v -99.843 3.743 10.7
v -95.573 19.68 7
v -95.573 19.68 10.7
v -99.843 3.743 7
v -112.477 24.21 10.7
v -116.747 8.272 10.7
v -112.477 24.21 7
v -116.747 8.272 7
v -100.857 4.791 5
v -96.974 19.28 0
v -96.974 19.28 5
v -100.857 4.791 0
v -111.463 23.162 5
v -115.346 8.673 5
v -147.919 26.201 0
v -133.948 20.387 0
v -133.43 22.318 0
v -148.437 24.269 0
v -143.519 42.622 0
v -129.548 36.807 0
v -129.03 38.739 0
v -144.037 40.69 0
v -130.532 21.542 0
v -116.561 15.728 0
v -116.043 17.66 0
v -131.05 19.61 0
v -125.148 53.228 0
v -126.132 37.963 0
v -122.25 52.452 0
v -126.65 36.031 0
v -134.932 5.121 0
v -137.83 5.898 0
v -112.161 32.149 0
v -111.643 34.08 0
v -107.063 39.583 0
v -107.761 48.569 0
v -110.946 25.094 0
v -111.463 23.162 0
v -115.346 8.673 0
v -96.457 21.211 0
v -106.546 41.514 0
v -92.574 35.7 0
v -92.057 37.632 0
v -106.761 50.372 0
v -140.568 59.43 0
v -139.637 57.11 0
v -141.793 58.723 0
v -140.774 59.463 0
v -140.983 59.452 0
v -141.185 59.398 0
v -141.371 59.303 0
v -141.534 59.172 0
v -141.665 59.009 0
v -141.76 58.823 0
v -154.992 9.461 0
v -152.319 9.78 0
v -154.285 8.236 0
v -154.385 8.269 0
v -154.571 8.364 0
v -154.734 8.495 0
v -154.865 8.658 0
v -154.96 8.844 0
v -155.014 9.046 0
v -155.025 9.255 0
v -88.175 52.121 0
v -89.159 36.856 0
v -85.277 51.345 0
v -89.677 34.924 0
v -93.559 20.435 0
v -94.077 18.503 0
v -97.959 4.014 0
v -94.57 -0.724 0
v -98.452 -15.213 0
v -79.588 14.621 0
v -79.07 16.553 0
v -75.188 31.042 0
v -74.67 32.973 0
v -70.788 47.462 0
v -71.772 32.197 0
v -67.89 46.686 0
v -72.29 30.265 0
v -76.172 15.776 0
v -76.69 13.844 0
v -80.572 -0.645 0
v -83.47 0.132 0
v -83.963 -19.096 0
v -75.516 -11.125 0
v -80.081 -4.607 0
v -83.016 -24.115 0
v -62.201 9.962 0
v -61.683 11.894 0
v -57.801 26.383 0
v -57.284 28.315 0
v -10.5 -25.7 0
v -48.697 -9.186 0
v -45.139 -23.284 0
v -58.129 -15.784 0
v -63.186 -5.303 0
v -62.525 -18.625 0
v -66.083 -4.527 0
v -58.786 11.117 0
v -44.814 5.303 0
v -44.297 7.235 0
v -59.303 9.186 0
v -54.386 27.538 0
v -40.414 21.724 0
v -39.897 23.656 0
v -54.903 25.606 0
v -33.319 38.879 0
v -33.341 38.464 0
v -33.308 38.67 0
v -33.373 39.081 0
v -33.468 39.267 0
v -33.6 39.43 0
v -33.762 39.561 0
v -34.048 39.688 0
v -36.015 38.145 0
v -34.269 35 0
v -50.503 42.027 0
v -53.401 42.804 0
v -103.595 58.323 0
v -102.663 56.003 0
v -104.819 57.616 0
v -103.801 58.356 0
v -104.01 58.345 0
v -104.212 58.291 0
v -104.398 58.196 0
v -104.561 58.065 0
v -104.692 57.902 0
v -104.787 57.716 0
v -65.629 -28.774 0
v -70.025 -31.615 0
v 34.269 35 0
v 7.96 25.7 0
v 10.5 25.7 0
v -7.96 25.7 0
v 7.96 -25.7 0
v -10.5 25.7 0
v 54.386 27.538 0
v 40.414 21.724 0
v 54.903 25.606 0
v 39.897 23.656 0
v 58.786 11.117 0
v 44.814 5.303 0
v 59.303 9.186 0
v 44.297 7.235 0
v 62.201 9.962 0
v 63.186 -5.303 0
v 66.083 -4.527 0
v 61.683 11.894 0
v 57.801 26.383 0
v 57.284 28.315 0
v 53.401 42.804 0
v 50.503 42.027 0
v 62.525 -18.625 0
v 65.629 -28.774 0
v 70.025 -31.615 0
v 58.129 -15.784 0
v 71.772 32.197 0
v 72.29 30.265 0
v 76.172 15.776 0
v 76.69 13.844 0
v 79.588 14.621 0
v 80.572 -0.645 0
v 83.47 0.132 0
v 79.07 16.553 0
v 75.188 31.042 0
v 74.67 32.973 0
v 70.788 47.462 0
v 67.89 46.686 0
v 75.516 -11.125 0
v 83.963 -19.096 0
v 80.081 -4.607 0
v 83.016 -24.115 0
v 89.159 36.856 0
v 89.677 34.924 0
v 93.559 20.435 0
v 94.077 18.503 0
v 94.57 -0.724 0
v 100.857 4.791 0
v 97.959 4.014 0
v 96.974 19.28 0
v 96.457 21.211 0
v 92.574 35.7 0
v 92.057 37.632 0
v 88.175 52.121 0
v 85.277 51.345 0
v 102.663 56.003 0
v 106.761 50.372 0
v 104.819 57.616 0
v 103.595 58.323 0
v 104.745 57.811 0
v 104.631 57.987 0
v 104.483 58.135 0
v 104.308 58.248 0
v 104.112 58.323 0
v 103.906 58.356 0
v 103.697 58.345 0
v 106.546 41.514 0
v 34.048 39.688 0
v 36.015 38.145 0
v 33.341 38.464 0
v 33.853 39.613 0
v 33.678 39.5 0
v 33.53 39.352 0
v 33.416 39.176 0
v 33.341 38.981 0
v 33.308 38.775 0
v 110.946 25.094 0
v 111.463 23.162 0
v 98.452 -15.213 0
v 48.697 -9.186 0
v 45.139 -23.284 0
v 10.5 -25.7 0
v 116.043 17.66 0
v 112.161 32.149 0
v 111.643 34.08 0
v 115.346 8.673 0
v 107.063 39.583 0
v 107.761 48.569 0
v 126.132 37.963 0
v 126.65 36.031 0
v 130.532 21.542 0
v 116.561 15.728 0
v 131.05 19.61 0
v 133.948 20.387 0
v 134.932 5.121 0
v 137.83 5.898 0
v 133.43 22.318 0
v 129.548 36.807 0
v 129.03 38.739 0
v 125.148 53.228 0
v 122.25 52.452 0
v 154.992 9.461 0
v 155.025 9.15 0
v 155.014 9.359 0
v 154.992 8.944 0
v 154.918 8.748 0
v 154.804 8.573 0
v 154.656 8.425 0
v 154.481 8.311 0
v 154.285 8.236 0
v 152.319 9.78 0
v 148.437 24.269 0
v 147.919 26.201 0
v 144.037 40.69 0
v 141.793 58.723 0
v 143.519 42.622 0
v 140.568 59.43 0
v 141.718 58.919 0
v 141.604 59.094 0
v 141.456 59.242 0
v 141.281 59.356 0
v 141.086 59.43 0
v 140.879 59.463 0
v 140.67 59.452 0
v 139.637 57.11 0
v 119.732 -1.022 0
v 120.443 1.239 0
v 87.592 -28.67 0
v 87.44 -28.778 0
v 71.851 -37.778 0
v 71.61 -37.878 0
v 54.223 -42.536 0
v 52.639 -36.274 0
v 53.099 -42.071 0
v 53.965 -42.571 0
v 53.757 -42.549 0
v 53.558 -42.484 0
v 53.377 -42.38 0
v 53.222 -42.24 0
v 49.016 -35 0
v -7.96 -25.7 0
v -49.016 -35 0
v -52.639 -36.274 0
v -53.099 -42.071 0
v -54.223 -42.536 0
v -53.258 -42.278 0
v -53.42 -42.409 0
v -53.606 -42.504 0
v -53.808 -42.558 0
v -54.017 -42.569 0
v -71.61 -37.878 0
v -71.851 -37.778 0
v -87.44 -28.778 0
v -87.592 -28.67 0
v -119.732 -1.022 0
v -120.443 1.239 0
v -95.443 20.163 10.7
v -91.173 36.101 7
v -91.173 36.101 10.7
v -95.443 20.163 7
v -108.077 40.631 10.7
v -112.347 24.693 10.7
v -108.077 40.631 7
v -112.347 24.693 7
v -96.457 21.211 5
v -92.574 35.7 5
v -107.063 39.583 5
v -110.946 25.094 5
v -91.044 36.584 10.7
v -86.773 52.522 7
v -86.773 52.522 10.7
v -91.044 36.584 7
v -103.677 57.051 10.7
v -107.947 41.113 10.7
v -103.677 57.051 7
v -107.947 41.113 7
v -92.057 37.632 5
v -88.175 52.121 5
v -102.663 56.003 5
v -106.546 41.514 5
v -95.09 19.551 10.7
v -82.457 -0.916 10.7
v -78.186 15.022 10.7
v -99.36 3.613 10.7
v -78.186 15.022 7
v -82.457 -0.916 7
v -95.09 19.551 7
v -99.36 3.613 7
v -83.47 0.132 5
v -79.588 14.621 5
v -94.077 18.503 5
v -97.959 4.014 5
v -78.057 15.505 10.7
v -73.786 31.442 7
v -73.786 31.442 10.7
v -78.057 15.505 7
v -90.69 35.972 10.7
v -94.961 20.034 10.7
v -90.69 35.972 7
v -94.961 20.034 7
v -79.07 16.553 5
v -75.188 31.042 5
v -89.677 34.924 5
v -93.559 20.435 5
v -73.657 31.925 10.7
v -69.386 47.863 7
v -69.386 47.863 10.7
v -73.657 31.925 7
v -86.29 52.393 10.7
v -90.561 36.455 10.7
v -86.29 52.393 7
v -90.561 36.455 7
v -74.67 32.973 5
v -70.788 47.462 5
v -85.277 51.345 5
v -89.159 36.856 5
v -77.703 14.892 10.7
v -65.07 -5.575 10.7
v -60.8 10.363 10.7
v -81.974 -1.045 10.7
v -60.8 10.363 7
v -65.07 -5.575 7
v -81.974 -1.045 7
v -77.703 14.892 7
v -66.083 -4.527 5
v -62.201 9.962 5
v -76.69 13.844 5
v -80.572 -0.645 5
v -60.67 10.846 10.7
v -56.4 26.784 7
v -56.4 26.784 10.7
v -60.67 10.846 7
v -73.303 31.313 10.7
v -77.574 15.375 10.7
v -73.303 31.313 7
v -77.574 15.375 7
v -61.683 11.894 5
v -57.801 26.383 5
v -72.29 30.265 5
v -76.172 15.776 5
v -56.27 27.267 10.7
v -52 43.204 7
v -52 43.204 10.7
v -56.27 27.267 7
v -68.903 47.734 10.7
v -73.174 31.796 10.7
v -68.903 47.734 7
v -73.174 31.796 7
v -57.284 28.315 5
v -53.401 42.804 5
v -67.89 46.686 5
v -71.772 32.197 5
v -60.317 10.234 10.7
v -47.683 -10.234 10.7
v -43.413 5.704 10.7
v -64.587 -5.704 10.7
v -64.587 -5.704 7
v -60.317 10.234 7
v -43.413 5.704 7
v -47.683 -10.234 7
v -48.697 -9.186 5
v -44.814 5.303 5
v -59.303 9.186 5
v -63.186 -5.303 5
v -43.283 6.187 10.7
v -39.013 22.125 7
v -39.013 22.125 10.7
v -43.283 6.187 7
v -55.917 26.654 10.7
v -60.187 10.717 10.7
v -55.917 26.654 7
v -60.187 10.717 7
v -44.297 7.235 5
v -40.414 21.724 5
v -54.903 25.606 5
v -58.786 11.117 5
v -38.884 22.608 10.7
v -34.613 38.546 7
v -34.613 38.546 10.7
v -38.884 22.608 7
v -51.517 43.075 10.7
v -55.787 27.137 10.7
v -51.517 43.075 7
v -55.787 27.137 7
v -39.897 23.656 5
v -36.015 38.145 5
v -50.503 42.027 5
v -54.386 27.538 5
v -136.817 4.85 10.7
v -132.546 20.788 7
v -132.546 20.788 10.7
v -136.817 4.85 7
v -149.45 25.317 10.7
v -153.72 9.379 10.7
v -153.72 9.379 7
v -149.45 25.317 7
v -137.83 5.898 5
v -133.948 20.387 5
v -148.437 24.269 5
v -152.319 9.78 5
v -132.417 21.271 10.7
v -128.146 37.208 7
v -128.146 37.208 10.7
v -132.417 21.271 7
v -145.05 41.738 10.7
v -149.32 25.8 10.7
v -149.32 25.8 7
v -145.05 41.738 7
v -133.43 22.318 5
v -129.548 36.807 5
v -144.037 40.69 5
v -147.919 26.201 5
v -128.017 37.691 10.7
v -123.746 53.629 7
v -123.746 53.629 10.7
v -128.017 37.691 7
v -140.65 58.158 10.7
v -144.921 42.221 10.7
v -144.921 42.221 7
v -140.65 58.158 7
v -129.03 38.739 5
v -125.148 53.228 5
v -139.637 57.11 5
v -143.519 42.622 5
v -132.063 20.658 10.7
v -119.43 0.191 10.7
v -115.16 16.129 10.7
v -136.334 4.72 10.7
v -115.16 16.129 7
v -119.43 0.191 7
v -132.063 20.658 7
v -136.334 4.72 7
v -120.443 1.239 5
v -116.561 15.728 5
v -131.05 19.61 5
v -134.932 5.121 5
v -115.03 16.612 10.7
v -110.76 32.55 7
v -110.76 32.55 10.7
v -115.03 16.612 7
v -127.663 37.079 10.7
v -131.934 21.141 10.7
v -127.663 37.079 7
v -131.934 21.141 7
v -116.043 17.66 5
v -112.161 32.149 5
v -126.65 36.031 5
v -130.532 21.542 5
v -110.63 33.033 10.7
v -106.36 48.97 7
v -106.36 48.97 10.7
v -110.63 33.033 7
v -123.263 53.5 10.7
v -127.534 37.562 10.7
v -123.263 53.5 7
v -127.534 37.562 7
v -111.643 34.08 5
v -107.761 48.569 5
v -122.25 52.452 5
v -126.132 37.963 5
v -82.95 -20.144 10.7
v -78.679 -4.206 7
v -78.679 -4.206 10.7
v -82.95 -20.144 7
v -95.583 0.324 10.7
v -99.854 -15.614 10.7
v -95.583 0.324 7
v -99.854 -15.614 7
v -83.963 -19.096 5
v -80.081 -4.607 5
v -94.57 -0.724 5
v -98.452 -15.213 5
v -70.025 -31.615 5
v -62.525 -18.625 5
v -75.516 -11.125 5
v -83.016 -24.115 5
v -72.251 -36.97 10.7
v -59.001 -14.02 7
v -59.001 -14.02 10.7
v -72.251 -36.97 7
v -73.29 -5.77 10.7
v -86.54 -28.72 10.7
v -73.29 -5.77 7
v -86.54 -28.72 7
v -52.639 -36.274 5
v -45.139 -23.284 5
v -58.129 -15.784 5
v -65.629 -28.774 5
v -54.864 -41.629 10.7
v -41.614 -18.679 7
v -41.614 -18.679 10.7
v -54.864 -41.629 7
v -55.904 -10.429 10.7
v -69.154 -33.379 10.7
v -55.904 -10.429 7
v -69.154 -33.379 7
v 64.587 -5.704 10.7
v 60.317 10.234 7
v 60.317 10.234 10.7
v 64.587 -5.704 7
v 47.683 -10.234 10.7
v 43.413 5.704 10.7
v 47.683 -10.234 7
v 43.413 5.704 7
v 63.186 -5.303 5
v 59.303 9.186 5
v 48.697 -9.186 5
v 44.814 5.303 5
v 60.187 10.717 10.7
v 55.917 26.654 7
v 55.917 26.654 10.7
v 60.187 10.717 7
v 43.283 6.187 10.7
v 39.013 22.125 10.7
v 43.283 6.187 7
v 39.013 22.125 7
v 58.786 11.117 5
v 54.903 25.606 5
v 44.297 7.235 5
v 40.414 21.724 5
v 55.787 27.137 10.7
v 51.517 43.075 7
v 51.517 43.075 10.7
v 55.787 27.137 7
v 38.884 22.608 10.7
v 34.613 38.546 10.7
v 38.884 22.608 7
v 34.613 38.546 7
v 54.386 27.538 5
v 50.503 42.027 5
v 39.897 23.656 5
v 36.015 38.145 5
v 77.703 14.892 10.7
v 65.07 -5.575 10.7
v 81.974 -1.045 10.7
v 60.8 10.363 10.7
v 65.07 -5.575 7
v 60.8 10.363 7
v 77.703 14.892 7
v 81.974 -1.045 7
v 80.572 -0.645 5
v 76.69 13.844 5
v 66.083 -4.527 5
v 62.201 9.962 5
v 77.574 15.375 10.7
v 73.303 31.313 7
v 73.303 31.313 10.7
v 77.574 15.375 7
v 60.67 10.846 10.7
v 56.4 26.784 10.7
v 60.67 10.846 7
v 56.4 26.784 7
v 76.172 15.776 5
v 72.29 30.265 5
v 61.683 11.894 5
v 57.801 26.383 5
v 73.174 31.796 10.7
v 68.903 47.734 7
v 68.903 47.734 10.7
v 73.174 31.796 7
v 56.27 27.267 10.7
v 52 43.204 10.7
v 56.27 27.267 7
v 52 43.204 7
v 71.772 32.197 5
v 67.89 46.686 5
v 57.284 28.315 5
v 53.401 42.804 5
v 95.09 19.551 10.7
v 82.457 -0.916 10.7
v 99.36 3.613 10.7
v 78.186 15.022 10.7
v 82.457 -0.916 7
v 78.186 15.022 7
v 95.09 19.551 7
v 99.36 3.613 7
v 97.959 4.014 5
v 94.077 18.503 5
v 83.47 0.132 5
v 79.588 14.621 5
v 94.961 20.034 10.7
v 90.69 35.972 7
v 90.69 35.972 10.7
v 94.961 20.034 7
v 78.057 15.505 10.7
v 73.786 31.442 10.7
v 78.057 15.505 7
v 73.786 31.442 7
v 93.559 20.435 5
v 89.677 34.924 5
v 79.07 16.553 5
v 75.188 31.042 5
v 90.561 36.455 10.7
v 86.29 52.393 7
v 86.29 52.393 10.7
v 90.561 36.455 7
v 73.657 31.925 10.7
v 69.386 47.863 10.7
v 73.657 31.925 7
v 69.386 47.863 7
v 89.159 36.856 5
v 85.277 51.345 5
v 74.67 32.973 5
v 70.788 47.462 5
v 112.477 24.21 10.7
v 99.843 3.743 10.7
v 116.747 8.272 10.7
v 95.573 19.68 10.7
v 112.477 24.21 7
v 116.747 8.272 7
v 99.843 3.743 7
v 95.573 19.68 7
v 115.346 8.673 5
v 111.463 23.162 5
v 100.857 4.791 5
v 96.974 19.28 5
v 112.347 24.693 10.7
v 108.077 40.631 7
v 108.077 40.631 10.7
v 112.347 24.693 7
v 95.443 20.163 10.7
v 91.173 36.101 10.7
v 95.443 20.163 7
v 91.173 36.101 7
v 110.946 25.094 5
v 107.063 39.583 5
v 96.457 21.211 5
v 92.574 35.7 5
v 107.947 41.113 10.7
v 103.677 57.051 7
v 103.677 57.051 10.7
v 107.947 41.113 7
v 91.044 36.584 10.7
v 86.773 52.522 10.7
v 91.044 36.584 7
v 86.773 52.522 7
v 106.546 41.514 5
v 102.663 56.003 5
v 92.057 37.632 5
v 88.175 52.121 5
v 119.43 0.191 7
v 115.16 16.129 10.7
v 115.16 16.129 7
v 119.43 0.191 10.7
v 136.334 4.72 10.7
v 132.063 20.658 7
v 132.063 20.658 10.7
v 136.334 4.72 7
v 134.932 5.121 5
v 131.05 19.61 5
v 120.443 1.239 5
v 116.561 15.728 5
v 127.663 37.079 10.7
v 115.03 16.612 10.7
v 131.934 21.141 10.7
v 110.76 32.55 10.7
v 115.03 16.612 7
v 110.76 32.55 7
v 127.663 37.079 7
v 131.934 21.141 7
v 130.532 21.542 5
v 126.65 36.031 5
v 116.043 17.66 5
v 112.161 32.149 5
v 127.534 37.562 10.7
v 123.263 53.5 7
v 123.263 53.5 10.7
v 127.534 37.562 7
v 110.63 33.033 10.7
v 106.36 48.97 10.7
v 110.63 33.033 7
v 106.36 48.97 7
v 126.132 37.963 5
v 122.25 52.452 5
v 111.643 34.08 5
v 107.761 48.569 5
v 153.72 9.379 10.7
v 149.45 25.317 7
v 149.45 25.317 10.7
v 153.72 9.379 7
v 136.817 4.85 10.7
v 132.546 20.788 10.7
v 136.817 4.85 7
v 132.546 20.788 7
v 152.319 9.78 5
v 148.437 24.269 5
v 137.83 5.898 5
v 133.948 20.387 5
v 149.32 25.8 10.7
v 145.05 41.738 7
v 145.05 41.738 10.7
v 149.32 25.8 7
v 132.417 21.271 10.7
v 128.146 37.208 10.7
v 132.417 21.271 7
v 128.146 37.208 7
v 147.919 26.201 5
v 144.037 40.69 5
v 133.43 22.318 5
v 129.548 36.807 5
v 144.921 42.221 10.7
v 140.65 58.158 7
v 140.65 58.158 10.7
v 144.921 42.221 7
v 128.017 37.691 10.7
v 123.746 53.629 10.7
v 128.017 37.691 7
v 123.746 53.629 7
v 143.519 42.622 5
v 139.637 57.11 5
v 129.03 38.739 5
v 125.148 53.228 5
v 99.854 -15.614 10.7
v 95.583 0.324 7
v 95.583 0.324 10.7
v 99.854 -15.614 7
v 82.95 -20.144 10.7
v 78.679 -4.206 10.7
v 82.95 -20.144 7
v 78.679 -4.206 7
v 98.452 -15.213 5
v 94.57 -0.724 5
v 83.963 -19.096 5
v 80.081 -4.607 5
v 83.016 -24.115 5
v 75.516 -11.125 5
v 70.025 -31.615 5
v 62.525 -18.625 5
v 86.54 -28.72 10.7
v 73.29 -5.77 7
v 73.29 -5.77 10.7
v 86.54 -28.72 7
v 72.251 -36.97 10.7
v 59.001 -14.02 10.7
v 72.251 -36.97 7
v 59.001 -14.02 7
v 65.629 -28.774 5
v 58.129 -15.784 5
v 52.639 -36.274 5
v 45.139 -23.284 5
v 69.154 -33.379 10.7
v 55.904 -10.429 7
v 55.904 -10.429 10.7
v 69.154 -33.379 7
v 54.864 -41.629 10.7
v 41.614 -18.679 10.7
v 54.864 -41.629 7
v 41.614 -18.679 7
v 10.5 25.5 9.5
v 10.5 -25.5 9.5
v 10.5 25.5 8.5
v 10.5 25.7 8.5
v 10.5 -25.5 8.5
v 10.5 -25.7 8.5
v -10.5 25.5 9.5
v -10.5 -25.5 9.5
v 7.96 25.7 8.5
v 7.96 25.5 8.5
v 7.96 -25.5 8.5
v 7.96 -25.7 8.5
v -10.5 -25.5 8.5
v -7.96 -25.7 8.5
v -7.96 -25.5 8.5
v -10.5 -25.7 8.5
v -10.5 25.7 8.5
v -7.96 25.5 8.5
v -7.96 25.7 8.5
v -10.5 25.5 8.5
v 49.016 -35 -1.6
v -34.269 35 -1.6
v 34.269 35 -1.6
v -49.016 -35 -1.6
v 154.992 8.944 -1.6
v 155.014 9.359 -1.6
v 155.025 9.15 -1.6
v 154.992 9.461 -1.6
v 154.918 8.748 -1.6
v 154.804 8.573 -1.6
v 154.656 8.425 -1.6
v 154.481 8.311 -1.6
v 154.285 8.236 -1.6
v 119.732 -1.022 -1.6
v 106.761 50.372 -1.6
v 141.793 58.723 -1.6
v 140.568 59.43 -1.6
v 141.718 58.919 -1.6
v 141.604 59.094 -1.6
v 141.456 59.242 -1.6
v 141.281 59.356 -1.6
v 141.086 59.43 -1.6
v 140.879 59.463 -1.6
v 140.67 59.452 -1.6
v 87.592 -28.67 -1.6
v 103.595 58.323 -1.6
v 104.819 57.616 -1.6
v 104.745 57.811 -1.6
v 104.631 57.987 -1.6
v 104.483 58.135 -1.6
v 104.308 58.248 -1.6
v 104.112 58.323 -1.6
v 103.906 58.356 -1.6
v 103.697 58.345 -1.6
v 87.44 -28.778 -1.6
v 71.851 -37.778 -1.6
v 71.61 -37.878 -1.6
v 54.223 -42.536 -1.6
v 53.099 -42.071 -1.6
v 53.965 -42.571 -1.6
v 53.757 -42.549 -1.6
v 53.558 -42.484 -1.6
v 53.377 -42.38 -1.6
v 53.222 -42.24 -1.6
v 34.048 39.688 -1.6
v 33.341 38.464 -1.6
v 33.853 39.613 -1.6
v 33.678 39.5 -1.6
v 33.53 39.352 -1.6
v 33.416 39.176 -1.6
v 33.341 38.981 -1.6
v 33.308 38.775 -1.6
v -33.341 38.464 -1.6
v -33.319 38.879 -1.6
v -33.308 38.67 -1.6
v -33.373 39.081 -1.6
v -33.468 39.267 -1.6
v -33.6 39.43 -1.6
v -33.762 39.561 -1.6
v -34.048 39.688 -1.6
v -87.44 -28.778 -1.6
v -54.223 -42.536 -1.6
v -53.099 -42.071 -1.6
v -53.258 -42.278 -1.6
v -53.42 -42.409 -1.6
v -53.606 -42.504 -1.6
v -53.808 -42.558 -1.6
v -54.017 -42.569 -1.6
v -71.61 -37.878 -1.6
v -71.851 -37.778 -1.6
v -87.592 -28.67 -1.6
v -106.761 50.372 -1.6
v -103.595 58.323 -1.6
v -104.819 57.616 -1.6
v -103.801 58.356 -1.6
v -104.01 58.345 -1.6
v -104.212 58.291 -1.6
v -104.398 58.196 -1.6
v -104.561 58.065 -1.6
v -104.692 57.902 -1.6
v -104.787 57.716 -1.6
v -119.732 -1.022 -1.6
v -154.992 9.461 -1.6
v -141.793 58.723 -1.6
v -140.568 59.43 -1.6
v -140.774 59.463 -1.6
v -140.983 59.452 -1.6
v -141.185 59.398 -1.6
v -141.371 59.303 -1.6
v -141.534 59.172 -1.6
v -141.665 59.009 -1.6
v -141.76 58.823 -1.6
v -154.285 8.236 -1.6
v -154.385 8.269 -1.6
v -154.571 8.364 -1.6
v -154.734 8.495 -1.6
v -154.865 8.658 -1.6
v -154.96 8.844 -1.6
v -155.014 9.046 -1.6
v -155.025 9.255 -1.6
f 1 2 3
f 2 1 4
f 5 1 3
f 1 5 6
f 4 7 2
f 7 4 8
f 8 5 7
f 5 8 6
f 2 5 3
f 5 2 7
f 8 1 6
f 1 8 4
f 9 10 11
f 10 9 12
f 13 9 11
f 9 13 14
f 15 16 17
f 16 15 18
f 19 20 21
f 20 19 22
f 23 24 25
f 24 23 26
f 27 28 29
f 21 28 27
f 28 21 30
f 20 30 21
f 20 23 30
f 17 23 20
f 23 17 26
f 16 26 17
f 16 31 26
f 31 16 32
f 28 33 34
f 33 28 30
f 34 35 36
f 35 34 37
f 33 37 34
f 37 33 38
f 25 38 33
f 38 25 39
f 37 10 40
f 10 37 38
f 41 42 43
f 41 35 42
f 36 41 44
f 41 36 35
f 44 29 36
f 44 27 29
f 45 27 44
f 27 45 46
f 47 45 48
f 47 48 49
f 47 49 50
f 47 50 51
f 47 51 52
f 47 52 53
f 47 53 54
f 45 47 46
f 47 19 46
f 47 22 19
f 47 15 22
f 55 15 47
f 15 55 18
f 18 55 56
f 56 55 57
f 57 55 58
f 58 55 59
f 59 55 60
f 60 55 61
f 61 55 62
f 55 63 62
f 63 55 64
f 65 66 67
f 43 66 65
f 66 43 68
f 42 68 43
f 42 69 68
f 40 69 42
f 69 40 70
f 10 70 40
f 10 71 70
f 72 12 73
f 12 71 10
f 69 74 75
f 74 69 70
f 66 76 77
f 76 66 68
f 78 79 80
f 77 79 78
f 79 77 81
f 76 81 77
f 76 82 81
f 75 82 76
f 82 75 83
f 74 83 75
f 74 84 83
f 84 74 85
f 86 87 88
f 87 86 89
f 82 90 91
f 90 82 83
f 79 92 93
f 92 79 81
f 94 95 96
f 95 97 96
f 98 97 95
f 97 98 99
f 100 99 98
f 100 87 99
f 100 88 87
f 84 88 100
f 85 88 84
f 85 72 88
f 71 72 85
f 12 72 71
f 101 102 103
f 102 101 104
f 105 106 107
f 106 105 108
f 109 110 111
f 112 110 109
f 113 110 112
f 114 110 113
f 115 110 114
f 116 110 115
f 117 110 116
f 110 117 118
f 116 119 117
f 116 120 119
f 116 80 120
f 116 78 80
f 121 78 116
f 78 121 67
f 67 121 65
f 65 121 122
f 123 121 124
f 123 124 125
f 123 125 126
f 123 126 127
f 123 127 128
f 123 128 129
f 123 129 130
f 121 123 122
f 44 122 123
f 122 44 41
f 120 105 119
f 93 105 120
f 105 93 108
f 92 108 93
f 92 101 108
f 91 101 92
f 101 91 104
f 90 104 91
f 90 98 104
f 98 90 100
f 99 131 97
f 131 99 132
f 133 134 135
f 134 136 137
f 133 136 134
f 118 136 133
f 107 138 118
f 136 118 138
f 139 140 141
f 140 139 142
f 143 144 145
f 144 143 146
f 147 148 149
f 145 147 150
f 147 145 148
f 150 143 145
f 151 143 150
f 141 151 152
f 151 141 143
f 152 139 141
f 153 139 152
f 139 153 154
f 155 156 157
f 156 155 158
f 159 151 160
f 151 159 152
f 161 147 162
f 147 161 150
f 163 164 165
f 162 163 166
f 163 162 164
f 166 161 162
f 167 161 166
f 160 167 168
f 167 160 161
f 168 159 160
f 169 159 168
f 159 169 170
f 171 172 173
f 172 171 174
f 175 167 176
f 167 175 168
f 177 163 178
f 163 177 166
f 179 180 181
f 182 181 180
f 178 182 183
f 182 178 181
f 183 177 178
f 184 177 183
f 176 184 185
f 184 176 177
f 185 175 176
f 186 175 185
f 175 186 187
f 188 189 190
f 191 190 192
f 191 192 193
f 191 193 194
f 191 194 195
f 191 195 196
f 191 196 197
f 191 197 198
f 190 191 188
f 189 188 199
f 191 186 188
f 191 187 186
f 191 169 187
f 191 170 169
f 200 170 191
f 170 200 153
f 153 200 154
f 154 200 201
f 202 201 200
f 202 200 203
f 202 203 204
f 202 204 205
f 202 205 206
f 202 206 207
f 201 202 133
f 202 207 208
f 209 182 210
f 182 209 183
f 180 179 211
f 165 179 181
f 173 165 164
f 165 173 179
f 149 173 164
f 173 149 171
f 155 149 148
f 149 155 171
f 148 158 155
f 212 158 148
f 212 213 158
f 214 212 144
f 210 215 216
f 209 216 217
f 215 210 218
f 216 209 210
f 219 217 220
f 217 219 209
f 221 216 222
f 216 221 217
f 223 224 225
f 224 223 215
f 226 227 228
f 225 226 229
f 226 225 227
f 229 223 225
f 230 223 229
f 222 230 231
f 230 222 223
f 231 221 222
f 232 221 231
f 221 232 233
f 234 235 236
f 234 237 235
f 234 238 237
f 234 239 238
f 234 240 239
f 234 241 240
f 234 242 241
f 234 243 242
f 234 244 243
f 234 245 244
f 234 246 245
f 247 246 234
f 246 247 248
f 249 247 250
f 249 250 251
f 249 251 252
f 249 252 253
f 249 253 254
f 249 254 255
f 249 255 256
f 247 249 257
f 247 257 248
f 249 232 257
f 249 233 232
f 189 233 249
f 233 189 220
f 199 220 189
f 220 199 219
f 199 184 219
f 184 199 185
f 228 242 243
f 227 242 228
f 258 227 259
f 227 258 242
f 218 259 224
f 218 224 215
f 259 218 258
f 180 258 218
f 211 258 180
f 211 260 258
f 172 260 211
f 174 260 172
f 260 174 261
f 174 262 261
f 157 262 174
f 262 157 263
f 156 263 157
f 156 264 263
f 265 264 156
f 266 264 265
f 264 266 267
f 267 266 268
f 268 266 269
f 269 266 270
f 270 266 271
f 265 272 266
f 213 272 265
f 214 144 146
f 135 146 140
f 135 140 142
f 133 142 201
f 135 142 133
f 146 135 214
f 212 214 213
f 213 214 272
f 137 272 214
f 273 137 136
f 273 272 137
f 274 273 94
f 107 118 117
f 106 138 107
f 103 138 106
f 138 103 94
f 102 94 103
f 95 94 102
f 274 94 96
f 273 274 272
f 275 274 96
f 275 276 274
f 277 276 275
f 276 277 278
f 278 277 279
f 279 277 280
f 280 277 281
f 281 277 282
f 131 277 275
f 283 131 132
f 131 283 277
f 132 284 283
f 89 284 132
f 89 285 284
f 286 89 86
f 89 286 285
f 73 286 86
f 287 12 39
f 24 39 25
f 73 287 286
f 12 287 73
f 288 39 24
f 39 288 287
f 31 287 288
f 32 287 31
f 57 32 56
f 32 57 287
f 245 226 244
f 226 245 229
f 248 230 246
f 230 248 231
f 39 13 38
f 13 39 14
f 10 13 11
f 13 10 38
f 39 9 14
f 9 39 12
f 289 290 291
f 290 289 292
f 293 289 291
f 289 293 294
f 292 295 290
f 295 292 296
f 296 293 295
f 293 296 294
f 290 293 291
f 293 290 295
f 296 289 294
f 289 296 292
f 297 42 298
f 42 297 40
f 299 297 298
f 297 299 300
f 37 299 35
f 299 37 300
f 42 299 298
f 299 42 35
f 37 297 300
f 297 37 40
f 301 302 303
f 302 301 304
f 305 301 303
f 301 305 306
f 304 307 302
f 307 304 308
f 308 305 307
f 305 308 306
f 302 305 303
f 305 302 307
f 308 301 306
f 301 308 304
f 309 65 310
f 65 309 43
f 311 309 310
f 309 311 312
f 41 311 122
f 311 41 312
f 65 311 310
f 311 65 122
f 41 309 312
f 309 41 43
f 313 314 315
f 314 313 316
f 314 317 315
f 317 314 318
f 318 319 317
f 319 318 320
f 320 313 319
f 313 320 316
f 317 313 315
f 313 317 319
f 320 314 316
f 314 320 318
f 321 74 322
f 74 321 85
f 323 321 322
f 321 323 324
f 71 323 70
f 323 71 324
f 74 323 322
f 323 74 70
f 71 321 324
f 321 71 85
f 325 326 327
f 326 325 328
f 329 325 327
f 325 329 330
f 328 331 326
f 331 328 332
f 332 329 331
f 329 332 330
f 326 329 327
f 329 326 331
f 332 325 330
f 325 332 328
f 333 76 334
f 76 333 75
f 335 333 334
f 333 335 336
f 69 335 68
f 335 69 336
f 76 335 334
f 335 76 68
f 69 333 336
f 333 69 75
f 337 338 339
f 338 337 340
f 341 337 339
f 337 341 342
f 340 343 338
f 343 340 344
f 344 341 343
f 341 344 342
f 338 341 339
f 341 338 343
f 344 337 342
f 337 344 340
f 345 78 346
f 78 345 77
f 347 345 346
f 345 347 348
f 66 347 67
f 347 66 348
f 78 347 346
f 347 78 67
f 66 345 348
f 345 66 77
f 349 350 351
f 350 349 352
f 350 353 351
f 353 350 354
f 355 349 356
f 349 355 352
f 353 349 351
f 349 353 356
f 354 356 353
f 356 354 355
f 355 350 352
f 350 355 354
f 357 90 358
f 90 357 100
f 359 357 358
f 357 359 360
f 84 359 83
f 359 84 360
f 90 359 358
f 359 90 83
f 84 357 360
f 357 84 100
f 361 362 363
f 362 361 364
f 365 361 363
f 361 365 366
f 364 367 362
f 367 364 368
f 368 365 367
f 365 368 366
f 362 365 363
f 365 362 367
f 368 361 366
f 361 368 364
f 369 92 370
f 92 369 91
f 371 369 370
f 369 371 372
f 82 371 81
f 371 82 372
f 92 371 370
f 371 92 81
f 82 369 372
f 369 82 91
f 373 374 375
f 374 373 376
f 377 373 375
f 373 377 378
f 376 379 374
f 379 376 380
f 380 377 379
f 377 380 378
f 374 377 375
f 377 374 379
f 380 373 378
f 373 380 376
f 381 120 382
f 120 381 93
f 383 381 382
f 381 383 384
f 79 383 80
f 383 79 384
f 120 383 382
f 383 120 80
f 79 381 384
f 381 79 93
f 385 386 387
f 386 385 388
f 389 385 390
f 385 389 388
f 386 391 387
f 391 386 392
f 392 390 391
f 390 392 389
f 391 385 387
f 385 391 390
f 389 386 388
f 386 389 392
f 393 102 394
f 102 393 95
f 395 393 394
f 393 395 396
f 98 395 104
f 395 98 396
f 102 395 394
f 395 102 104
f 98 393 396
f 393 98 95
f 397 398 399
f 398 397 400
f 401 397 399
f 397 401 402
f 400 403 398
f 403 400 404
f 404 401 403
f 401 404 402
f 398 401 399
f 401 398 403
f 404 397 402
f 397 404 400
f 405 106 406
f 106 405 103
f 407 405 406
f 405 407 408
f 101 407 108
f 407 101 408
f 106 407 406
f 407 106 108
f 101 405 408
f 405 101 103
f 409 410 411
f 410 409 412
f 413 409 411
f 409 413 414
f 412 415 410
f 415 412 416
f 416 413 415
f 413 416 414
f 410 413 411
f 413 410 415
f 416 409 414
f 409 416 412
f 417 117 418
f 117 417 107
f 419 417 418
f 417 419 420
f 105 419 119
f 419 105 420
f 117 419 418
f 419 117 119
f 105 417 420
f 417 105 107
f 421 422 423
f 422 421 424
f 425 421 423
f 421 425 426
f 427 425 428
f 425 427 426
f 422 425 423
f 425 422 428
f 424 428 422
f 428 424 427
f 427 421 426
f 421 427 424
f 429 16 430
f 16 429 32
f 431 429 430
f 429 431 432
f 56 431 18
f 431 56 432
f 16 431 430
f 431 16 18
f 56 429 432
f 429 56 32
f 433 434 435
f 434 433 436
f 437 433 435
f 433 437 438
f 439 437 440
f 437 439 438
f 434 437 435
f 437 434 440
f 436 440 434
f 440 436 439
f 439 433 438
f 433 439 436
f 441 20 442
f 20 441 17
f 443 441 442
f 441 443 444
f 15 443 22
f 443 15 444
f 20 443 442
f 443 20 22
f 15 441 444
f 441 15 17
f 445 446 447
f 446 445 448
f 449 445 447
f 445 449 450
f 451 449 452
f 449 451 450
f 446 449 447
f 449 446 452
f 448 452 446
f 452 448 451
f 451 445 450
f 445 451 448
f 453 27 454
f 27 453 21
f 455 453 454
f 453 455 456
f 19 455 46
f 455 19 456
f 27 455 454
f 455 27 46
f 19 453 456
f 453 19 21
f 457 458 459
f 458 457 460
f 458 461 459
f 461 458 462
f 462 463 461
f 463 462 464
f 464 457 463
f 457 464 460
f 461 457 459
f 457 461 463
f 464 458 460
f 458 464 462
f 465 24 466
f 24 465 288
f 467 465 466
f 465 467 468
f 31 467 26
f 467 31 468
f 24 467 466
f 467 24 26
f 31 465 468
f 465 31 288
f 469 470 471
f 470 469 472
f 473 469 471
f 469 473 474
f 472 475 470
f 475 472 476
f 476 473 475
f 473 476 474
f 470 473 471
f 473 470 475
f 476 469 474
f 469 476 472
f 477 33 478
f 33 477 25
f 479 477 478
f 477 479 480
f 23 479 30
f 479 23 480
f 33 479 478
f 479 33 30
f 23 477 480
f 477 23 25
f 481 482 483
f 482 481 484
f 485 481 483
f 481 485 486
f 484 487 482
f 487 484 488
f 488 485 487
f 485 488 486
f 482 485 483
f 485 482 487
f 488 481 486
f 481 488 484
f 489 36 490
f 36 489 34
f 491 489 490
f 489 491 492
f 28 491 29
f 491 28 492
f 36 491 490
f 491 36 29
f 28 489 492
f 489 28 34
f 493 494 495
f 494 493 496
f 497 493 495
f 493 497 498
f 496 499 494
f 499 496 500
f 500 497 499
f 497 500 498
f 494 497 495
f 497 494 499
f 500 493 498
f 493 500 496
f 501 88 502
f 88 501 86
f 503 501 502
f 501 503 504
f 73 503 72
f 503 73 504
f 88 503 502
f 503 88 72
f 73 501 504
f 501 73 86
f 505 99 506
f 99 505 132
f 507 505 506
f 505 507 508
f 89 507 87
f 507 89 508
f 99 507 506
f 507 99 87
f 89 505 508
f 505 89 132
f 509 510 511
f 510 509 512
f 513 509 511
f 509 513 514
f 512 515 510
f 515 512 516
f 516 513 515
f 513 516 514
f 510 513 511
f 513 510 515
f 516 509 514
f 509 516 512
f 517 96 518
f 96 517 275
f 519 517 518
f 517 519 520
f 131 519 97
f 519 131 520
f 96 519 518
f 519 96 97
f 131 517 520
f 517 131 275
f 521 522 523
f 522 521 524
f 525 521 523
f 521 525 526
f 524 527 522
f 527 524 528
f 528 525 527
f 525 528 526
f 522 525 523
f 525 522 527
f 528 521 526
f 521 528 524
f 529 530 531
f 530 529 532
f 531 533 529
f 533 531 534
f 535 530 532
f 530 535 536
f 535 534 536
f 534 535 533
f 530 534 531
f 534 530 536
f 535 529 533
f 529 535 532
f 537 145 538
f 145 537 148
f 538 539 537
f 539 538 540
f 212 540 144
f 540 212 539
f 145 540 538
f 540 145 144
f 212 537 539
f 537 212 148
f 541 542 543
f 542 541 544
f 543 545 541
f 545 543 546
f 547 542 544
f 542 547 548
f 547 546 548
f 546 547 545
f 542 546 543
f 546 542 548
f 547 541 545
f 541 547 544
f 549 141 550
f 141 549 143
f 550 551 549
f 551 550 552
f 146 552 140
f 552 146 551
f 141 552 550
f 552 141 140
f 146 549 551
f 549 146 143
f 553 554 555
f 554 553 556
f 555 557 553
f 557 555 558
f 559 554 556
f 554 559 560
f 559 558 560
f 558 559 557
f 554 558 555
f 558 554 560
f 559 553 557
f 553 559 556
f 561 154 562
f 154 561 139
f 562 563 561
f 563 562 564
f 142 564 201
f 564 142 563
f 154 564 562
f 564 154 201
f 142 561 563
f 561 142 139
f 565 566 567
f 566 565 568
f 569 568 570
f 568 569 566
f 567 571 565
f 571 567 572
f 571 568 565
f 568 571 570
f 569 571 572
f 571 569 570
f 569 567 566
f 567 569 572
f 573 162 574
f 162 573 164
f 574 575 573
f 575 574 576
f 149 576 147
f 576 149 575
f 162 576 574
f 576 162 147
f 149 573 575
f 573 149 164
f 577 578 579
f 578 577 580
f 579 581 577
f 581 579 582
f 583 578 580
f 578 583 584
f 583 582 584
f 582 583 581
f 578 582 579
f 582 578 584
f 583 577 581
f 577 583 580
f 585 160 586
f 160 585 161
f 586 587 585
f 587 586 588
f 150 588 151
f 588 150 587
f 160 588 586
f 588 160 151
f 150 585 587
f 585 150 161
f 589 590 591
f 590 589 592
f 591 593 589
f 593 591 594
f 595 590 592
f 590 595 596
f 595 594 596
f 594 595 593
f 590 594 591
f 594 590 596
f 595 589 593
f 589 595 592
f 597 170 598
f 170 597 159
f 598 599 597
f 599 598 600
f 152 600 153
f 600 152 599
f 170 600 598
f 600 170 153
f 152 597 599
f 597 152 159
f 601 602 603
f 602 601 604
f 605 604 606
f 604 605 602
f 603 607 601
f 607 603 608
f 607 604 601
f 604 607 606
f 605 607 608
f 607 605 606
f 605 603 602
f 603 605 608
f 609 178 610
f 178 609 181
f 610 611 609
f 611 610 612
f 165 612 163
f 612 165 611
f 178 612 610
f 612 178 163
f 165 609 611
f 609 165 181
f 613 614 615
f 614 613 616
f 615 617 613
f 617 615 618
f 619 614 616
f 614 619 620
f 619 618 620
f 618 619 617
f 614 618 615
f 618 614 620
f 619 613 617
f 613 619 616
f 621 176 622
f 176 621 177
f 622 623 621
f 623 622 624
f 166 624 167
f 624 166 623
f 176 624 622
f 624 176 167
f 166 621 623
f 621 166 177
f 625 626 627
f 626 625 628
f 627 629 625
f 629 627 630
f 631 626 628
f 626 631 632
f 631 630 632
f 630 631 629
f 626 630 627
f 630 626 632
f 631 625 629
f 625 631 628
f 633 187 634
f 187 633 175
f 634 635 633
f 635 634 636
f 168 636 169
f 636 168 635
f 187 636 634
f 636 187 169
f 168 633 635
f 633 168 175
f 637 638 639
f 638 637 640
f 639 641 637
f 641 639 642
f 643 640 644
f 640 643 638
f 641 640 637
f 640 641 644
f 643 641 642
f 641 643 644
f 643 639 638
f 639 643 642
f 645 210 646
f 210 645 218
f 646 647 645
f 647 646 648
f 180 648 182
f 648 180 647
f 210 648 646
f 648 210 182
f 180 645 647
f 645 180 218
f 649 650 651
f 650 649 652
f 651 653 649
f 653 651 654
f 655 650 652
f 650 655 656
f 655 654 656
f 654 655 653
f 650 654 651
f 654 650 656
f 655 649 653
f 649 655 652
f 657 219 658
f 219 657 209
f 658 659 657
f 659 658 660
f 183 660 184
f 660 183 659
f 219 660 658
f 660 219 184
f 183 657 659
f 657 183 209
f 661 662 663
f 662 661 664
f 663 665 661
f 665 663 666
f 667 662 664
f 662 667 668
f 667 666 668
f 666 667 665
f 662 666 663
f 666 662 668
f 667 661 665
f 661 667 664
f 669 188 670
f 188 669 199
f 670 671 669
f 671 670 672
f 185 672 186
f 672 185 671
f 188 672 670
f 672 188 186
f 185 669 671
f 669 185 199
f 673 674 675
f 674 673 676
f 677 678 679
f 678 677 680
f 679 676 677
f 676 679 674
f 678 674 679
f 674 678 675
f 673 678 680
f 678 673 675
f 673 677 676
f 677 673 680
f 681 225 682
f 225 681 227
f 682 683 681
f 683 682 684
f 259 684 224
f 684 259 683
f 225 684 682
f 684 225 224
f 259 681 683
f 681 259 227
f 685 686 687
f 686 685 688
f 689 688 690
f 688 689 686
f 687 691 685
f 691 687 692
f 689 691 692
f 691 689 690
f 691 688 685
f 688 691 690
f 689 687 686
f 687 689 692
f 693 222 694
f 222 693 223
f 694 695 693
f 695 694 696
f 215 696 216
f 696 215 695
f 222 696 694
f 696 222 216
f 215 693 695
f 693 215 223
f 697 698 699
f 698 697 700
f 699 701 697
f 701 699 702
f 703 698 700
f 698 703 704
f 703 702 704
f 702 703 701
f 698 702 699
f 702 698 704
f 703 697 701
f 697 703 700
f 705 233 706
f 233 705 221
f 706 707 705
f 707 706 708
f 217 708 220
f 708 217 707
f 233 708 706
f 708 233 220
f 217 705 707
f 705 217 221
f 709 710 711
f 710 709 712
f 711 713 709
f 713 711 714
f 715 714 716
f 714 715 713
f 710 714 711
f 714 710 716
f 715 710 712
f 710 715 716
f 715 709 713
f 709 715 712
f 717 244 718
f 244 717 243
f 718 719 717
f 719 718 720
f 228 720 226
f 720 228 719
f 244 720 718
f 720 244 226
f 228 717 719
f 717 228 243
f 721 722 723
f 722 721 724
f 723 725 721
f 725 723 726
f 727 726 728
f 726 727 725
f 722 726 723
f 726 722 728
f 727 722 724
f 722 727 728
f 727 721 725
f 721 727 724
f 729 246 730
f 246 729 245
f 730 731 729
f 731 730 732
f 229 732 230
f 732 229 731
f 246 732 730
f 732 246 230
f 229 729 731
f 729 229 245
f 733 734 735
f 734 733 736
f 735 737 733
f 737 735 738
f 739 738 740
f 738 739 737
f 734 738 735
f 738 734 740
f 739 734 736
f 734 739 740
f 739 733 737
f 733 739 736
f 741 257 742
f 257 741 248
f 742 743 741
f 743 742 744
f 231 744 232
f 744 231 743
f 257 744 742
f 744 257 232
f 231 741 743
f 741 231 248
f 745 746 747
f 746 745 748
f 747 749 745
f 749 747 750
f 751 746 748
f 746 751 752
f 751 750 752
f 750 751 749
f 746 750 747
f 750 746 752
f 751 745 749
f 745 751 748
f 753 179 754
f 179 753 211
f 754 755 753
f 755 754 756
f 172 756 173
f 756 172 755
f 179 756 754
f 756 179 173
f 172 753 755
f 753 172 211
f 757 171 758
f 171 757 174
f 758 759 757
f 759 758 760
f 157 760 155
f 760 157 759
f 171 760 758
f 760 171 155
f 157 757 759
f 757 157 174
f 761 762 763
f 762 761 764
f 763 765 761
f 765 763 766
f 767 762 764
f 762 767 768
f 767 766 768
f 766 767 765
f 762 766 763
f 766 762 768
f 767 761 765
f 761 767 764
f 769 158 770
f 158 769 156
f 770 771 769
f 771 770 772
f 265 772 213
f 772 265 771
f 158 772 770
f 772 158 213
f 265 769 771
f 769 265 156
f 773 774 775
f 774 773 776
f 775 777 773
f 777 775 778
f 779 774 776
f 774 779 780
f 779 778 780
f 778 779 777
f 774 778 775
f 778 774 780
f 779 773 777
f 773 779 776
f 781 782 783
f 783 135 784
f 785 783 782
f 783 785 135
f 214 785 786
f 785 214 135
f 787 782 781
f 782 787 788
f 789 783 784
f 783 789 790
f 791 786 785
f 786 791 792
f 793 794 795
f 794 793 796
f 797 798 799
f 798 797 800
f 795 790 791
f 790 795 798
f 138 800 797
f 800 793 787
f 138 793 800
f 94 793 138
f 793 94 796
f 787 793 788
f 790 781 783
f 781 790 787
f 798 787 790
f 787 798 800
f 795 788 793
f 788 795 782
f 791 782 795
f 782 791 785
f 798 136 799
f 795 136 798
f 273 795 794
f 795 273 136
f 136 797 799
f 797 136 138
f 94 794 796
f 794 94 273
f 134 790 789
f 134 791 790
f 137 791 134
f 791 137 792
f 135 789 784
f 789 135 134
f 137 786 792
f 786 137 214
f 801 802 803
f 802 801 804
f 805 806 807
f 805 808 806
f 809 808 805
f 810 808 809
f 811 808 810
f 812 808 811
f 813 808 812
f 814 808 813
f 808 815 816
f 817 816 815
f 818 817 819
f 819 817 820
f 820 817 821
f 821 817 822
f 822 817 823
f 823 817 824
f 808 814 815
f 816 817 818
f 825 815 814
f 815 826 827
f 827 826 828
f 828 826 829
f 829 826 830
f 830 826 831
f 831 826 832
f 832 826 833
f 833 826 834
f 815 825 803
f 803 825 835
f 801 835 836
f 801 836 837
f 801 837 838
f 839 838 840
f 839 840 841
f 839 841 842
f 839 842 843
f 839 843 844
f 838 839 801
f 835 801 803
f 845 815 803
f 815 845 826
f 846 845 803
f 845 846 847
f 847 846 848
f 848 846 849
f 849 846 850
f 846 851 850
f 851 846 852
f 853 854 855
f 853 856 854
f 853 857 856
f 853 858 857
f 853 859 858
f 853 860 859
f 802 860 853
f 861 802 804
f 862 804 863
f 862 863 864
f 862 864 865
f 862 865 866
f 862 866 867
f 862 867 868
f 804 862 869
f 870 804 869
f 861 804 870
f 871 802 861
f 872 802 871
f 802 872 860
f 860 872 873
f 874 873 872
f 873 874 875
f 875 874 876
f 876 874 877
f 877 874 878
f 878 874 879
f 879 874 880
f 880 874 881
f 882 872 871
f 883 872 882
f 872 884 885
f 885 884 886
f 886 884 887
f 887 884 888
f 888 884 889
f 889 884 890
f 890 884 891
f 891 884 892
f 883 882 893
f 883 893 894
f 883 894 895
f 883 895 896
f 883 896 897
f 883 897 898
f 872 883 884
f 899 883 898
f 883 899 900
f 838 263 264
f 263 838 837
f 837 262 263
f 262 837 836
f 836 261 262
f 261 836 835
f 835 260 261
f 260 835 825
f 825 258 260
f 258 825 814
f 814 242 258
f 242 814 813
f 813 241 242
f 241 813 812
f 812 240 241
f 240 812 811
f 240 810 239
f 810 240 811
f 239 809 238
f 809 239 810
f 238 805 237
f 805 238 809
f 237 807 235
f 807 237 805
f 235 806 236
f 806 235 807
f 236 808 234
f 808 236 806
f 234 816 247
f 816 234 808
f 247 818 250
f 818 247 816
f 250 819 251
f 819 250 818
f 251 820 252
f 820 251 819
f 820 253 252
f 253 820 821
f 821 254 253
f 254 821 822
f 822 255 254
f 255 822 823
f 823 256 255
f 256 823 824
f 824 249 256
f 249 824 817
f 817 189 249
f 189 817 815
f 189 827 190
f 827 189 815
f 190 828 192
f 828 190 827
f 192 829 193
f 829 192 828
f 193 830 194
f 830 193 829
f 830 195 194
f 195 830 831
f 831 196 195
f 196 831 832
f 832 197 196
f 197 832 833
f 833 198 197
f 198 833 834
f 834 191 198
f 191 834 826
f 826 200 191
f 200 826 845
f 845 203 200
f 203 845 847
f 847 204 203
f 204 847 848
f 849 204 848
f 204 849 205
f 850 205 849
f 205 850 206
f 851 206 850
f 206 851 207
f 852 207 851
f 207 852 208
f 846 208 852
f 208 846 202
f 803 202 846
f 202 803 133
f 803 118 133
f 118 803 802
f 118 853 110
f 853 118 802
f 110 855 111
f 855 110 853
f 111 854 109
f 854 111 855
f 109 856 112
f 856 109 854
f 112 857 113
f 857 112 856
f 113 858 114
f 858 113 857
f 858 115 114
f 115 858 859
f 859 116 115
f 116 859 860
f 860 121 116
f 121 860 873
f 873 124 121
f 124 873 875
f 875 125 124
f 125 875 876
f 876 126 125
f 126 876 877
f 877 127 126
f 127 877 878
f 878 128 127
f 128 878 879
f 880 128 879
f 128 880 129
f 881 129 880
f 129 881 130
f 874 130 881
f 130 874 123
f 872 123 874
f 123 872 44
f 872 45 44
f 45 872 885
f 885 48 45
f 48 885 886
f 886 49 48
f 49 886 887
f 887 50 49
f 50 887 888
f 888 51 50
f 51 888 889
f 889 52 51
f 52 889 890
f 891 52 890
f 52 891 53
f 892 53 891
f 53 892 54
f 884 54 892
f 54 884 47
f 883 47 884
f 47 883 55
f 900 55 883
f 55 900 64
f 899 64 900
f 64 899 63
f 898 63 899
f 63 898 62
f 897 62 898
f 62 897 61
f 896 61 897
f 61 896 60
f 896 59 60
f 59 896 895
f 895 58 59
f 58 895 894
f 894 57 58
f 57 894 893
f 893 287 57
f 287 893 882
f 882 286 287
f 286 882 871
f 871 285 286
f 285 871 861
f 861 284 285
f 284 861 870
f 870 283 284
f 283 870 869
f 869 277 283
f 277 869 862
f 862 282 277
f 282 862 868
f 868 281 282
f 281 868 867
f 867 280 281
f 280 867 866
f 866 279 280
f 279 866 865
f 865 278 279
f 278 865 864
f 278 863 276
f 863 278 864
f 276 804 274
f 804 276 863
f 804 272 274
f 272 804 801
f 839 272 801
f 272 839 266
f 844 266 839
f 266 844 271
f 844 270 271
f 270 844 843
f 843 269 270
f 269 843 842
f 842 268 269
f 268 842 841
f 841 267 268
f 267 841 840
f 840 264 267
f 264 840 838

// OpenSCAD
// file: pico.scad
module pico() {
  translate([0, 0, 9])
  cube([21, 51, 1], center=true);
  header_len = 0.6+2.54*20;
  color("black")
  translate([-10.5+2.54/2, 0, 8.5/2])
  cube([2.54, header_len, 8.5], center=true);
  color("black")
  translate([10.5-2.54/2, 0, 8.5/2])
  cube([2.54, header_len, 8.5], center=true);
}

pico();
// file: choc_v1.scad
module choc_v1(c="Indigo") {
  // $fs = 0.02;
  color(c)
  difference() {
    translate([0,0,2.5])
    cube([15, 15, 5], center=true);
    // cylinder(h=1, d=3.40, center=true);
  }
}

module choc_1u_kc(c="Ivory") {
  color(c)
  translate([0,0,1.85])
  cube([17.5, 16.5, 3.7], center=true);
}

module choc_1p5u_kc(c="Ivory") {
  color(c)
  translate([0,0,1.85])
  cube([26.5, 16.5, 3.7], center=true);
}

module choc_1p5uR_kc(c="Ivory") {
  color(c)
  translate([0,0,1.85])
  cube([16.5, 26.5, 3.7], center=true);
}

module choc_1u(s="", c="Ivory", with_kc=true) {
  choc_v1();
  if (with_kc) {
    translate([0,0,7])
    difference() {
      choc_1u_kc(c=c);
      translate([0,0,3.5]) text(s, size=5, halign="center", valign="center");
    }
  }
}

module choc_1p5u(c="Ivory", with_kc=true) {
  choc_v1();
  if (with_kc) {
    translate([0,0,7])
    choc_1p5u_kc(c=c);
  }
}

module choc_1p5uR(c="Ivory", with_kc=true) {
  choc_v1();
  if (with_kc) {
    translate([0,0,7])
    choc_1p5uR_kc(c=c);
  }
}

choc_1u("A");
translate([20,0,0])
choc_1u(with_kc=false);
// main file
use <choc_v1.scad>;
use <pico.scad>;

cdx = 18;
cdy = 17;

module choc_1u_array(nx, ny, letters, with_kc) {
  for(i = [0:nx-1]) {
    for(j = [0:ny-1]) {
      translate([i*cdx, j*cdy, 0])
      choc_1u(s=letters[i + nx*(ny-j-1)], with_kc=with_kc);
    }
  }
}

module layout_lh(with_kc=true) {
  choc_1u_array(4, 3,
    ["W", "E", "R", "T",
    "S", "D", "F", "G",
    "X", "C", "V", "B"],
    with_kc=with_kc);
  translate([-2*cdx, -0.5*cdy, 0])
  choc_1u_array(2, 3,
    [" ", "Q", " ", "A", " ", "Z"],
    with_kc=with_kc);
  translate([1.25*cdx, -1.1*cdy, 0])
  choc_1u(with_kc=with_kc);
  translate([2.3*cdx, -1.5*cdy, 0])
  rotate(-15)
  choc_1p5uR(with_kc=with_kc);
  translate([3.3*cdx, -1.5*cdy, 0])
  rotate(-15)
  choc_1p5uR(with_kc=with_kc);
}

module layout_rh(with_kc=true) {
  choc_1u_array(4, 3,
    ["Y", "U", "I", "O",
    "H", "J", "K", "L",
    "N", "M", ",", "."],
    with_kc=with_kc);
  translate([4*cdx, -0.5*cdy, 0])
  choc_1u_array(2, 3,
    ["P", " ", ";", " ", "/", " "],
    with_kc=with_kc);
  translate([(3-1.25)*cdx, -1.1*cdy, 0])
  choc_1u(with_kc=with_kc);
  translate([(3-2.3)*cdx, -1.5*cdy, 0])
  rotate(15)
  choc_1p5uR(with_kc=with_kc);
  translate([(3-3.3)*cdx, -1.5*cdy, 0])
  rotate(15)
  choc_1p5uR(with_kc=with_kc);
}

module pcb_half() {
  center_t1 = [(2.3+.5)*cdx, (-1.5+.5)*cdy];
  center_t2 = [(3.3+.5)*cdx, (-1.5+.5)*cdy];
  t1_rot = -15;
  t2_rot = -15;
  cornerL_t1 = [
    center_t1[0] - 0.5*cdx*cos(t1_rot) + 0.75*cdy*sin(t1_rot),
    center_t1[1] - 0.5*cdx*sin(t1_rot) - 0.75*cdy*cos(t1_rot)
  ];
  cornerR_t1 = [
    center_t1[0] + 0.5*cdx*cos(t1_rot) + 0.75*cdy*sin(t1_rot),
    center_t1[1] + 0.5*cdx*sin(t1_rot) - 0.75*cdy*cos(t1_rot)
  ];
  cornerR_t2 = [
    center_t2[0] + 0.5*cdx*cos(t2_rot) + 0.75*cdy*sin(t2_rot),
    center_t2[1] + 0.5*cdx*sin(t2_rot) - 0.75*cdy*cos(t2_rot)
  ];
  cornerU_t2 = [
    center_t2[0] + 0.5*cdx*cos(t2_rot) - 0.75*cdy*sin(t2_rot),
    center_t2[1] + 0.5*cdx*sin(t2_rot) + 0.75*cdy*cos(t2_rot)
  ];
  translate([-0.5*cdx, -0.5*cdy, 0])
  union() {
    polygon([
      [0,0], [4*cdx,0],
      [4*cdx,3*cdy], [0,3*cdy]
    ]);
    polygon([
      [0,0], [0,-0.5*cdy],
      cornerL_t1, cornerR_t1,
      cornerR_t2, cornerU_t2,
      [4*cdx,0]
    ]);
    polygon([
      [-2*cdx,-0.5*cdy],[0,-0.5*cdy],
      [0,2.5*cdy],[-2*cdx,2.5*cdy]
    ]);
  }
}

module pcb_mid() {
  polygon([
    [-3*cdx,-2*cdy], [3*cdx,-2*cdy],
    [3*cdx,2*cdy], [-3*cdx,2*cdy]
  ]);
}

module pcb() {
  $fs = 0.05;
  color("IndianRed")
  translate([0, 0, -1.6])
  linear_extrude(1.6, center=false)
  offset(r = 1)
  union() {
    translate([-3*cdx, 0, 0])
    rotate(-15)
    translate([-3*cdx, 0, 0])
    pcb_half();
    translate([3*cdx, 0, 0])
    rotate(15)
    mirror([1,0,0])
    translate([-3*cdx, 0, 0])
    pcb_half();
    pcb_mid();
  }
}

module layout(with_kc=true, with_pico=true) {
  translate([-3*cdx, 0, 0])
  rotate(-15)
  translate([-3*cdx, 0, 0])
  layout_lh(with_kc=with_kc);
  translate([3*cdx, 0, 0])
  rotate(15)
  layout_rh(with_kc=with_kc);
  if (with_pico) {
    translate([0, 0, 0])
    pico();
  }
}

layout();
pcb();
